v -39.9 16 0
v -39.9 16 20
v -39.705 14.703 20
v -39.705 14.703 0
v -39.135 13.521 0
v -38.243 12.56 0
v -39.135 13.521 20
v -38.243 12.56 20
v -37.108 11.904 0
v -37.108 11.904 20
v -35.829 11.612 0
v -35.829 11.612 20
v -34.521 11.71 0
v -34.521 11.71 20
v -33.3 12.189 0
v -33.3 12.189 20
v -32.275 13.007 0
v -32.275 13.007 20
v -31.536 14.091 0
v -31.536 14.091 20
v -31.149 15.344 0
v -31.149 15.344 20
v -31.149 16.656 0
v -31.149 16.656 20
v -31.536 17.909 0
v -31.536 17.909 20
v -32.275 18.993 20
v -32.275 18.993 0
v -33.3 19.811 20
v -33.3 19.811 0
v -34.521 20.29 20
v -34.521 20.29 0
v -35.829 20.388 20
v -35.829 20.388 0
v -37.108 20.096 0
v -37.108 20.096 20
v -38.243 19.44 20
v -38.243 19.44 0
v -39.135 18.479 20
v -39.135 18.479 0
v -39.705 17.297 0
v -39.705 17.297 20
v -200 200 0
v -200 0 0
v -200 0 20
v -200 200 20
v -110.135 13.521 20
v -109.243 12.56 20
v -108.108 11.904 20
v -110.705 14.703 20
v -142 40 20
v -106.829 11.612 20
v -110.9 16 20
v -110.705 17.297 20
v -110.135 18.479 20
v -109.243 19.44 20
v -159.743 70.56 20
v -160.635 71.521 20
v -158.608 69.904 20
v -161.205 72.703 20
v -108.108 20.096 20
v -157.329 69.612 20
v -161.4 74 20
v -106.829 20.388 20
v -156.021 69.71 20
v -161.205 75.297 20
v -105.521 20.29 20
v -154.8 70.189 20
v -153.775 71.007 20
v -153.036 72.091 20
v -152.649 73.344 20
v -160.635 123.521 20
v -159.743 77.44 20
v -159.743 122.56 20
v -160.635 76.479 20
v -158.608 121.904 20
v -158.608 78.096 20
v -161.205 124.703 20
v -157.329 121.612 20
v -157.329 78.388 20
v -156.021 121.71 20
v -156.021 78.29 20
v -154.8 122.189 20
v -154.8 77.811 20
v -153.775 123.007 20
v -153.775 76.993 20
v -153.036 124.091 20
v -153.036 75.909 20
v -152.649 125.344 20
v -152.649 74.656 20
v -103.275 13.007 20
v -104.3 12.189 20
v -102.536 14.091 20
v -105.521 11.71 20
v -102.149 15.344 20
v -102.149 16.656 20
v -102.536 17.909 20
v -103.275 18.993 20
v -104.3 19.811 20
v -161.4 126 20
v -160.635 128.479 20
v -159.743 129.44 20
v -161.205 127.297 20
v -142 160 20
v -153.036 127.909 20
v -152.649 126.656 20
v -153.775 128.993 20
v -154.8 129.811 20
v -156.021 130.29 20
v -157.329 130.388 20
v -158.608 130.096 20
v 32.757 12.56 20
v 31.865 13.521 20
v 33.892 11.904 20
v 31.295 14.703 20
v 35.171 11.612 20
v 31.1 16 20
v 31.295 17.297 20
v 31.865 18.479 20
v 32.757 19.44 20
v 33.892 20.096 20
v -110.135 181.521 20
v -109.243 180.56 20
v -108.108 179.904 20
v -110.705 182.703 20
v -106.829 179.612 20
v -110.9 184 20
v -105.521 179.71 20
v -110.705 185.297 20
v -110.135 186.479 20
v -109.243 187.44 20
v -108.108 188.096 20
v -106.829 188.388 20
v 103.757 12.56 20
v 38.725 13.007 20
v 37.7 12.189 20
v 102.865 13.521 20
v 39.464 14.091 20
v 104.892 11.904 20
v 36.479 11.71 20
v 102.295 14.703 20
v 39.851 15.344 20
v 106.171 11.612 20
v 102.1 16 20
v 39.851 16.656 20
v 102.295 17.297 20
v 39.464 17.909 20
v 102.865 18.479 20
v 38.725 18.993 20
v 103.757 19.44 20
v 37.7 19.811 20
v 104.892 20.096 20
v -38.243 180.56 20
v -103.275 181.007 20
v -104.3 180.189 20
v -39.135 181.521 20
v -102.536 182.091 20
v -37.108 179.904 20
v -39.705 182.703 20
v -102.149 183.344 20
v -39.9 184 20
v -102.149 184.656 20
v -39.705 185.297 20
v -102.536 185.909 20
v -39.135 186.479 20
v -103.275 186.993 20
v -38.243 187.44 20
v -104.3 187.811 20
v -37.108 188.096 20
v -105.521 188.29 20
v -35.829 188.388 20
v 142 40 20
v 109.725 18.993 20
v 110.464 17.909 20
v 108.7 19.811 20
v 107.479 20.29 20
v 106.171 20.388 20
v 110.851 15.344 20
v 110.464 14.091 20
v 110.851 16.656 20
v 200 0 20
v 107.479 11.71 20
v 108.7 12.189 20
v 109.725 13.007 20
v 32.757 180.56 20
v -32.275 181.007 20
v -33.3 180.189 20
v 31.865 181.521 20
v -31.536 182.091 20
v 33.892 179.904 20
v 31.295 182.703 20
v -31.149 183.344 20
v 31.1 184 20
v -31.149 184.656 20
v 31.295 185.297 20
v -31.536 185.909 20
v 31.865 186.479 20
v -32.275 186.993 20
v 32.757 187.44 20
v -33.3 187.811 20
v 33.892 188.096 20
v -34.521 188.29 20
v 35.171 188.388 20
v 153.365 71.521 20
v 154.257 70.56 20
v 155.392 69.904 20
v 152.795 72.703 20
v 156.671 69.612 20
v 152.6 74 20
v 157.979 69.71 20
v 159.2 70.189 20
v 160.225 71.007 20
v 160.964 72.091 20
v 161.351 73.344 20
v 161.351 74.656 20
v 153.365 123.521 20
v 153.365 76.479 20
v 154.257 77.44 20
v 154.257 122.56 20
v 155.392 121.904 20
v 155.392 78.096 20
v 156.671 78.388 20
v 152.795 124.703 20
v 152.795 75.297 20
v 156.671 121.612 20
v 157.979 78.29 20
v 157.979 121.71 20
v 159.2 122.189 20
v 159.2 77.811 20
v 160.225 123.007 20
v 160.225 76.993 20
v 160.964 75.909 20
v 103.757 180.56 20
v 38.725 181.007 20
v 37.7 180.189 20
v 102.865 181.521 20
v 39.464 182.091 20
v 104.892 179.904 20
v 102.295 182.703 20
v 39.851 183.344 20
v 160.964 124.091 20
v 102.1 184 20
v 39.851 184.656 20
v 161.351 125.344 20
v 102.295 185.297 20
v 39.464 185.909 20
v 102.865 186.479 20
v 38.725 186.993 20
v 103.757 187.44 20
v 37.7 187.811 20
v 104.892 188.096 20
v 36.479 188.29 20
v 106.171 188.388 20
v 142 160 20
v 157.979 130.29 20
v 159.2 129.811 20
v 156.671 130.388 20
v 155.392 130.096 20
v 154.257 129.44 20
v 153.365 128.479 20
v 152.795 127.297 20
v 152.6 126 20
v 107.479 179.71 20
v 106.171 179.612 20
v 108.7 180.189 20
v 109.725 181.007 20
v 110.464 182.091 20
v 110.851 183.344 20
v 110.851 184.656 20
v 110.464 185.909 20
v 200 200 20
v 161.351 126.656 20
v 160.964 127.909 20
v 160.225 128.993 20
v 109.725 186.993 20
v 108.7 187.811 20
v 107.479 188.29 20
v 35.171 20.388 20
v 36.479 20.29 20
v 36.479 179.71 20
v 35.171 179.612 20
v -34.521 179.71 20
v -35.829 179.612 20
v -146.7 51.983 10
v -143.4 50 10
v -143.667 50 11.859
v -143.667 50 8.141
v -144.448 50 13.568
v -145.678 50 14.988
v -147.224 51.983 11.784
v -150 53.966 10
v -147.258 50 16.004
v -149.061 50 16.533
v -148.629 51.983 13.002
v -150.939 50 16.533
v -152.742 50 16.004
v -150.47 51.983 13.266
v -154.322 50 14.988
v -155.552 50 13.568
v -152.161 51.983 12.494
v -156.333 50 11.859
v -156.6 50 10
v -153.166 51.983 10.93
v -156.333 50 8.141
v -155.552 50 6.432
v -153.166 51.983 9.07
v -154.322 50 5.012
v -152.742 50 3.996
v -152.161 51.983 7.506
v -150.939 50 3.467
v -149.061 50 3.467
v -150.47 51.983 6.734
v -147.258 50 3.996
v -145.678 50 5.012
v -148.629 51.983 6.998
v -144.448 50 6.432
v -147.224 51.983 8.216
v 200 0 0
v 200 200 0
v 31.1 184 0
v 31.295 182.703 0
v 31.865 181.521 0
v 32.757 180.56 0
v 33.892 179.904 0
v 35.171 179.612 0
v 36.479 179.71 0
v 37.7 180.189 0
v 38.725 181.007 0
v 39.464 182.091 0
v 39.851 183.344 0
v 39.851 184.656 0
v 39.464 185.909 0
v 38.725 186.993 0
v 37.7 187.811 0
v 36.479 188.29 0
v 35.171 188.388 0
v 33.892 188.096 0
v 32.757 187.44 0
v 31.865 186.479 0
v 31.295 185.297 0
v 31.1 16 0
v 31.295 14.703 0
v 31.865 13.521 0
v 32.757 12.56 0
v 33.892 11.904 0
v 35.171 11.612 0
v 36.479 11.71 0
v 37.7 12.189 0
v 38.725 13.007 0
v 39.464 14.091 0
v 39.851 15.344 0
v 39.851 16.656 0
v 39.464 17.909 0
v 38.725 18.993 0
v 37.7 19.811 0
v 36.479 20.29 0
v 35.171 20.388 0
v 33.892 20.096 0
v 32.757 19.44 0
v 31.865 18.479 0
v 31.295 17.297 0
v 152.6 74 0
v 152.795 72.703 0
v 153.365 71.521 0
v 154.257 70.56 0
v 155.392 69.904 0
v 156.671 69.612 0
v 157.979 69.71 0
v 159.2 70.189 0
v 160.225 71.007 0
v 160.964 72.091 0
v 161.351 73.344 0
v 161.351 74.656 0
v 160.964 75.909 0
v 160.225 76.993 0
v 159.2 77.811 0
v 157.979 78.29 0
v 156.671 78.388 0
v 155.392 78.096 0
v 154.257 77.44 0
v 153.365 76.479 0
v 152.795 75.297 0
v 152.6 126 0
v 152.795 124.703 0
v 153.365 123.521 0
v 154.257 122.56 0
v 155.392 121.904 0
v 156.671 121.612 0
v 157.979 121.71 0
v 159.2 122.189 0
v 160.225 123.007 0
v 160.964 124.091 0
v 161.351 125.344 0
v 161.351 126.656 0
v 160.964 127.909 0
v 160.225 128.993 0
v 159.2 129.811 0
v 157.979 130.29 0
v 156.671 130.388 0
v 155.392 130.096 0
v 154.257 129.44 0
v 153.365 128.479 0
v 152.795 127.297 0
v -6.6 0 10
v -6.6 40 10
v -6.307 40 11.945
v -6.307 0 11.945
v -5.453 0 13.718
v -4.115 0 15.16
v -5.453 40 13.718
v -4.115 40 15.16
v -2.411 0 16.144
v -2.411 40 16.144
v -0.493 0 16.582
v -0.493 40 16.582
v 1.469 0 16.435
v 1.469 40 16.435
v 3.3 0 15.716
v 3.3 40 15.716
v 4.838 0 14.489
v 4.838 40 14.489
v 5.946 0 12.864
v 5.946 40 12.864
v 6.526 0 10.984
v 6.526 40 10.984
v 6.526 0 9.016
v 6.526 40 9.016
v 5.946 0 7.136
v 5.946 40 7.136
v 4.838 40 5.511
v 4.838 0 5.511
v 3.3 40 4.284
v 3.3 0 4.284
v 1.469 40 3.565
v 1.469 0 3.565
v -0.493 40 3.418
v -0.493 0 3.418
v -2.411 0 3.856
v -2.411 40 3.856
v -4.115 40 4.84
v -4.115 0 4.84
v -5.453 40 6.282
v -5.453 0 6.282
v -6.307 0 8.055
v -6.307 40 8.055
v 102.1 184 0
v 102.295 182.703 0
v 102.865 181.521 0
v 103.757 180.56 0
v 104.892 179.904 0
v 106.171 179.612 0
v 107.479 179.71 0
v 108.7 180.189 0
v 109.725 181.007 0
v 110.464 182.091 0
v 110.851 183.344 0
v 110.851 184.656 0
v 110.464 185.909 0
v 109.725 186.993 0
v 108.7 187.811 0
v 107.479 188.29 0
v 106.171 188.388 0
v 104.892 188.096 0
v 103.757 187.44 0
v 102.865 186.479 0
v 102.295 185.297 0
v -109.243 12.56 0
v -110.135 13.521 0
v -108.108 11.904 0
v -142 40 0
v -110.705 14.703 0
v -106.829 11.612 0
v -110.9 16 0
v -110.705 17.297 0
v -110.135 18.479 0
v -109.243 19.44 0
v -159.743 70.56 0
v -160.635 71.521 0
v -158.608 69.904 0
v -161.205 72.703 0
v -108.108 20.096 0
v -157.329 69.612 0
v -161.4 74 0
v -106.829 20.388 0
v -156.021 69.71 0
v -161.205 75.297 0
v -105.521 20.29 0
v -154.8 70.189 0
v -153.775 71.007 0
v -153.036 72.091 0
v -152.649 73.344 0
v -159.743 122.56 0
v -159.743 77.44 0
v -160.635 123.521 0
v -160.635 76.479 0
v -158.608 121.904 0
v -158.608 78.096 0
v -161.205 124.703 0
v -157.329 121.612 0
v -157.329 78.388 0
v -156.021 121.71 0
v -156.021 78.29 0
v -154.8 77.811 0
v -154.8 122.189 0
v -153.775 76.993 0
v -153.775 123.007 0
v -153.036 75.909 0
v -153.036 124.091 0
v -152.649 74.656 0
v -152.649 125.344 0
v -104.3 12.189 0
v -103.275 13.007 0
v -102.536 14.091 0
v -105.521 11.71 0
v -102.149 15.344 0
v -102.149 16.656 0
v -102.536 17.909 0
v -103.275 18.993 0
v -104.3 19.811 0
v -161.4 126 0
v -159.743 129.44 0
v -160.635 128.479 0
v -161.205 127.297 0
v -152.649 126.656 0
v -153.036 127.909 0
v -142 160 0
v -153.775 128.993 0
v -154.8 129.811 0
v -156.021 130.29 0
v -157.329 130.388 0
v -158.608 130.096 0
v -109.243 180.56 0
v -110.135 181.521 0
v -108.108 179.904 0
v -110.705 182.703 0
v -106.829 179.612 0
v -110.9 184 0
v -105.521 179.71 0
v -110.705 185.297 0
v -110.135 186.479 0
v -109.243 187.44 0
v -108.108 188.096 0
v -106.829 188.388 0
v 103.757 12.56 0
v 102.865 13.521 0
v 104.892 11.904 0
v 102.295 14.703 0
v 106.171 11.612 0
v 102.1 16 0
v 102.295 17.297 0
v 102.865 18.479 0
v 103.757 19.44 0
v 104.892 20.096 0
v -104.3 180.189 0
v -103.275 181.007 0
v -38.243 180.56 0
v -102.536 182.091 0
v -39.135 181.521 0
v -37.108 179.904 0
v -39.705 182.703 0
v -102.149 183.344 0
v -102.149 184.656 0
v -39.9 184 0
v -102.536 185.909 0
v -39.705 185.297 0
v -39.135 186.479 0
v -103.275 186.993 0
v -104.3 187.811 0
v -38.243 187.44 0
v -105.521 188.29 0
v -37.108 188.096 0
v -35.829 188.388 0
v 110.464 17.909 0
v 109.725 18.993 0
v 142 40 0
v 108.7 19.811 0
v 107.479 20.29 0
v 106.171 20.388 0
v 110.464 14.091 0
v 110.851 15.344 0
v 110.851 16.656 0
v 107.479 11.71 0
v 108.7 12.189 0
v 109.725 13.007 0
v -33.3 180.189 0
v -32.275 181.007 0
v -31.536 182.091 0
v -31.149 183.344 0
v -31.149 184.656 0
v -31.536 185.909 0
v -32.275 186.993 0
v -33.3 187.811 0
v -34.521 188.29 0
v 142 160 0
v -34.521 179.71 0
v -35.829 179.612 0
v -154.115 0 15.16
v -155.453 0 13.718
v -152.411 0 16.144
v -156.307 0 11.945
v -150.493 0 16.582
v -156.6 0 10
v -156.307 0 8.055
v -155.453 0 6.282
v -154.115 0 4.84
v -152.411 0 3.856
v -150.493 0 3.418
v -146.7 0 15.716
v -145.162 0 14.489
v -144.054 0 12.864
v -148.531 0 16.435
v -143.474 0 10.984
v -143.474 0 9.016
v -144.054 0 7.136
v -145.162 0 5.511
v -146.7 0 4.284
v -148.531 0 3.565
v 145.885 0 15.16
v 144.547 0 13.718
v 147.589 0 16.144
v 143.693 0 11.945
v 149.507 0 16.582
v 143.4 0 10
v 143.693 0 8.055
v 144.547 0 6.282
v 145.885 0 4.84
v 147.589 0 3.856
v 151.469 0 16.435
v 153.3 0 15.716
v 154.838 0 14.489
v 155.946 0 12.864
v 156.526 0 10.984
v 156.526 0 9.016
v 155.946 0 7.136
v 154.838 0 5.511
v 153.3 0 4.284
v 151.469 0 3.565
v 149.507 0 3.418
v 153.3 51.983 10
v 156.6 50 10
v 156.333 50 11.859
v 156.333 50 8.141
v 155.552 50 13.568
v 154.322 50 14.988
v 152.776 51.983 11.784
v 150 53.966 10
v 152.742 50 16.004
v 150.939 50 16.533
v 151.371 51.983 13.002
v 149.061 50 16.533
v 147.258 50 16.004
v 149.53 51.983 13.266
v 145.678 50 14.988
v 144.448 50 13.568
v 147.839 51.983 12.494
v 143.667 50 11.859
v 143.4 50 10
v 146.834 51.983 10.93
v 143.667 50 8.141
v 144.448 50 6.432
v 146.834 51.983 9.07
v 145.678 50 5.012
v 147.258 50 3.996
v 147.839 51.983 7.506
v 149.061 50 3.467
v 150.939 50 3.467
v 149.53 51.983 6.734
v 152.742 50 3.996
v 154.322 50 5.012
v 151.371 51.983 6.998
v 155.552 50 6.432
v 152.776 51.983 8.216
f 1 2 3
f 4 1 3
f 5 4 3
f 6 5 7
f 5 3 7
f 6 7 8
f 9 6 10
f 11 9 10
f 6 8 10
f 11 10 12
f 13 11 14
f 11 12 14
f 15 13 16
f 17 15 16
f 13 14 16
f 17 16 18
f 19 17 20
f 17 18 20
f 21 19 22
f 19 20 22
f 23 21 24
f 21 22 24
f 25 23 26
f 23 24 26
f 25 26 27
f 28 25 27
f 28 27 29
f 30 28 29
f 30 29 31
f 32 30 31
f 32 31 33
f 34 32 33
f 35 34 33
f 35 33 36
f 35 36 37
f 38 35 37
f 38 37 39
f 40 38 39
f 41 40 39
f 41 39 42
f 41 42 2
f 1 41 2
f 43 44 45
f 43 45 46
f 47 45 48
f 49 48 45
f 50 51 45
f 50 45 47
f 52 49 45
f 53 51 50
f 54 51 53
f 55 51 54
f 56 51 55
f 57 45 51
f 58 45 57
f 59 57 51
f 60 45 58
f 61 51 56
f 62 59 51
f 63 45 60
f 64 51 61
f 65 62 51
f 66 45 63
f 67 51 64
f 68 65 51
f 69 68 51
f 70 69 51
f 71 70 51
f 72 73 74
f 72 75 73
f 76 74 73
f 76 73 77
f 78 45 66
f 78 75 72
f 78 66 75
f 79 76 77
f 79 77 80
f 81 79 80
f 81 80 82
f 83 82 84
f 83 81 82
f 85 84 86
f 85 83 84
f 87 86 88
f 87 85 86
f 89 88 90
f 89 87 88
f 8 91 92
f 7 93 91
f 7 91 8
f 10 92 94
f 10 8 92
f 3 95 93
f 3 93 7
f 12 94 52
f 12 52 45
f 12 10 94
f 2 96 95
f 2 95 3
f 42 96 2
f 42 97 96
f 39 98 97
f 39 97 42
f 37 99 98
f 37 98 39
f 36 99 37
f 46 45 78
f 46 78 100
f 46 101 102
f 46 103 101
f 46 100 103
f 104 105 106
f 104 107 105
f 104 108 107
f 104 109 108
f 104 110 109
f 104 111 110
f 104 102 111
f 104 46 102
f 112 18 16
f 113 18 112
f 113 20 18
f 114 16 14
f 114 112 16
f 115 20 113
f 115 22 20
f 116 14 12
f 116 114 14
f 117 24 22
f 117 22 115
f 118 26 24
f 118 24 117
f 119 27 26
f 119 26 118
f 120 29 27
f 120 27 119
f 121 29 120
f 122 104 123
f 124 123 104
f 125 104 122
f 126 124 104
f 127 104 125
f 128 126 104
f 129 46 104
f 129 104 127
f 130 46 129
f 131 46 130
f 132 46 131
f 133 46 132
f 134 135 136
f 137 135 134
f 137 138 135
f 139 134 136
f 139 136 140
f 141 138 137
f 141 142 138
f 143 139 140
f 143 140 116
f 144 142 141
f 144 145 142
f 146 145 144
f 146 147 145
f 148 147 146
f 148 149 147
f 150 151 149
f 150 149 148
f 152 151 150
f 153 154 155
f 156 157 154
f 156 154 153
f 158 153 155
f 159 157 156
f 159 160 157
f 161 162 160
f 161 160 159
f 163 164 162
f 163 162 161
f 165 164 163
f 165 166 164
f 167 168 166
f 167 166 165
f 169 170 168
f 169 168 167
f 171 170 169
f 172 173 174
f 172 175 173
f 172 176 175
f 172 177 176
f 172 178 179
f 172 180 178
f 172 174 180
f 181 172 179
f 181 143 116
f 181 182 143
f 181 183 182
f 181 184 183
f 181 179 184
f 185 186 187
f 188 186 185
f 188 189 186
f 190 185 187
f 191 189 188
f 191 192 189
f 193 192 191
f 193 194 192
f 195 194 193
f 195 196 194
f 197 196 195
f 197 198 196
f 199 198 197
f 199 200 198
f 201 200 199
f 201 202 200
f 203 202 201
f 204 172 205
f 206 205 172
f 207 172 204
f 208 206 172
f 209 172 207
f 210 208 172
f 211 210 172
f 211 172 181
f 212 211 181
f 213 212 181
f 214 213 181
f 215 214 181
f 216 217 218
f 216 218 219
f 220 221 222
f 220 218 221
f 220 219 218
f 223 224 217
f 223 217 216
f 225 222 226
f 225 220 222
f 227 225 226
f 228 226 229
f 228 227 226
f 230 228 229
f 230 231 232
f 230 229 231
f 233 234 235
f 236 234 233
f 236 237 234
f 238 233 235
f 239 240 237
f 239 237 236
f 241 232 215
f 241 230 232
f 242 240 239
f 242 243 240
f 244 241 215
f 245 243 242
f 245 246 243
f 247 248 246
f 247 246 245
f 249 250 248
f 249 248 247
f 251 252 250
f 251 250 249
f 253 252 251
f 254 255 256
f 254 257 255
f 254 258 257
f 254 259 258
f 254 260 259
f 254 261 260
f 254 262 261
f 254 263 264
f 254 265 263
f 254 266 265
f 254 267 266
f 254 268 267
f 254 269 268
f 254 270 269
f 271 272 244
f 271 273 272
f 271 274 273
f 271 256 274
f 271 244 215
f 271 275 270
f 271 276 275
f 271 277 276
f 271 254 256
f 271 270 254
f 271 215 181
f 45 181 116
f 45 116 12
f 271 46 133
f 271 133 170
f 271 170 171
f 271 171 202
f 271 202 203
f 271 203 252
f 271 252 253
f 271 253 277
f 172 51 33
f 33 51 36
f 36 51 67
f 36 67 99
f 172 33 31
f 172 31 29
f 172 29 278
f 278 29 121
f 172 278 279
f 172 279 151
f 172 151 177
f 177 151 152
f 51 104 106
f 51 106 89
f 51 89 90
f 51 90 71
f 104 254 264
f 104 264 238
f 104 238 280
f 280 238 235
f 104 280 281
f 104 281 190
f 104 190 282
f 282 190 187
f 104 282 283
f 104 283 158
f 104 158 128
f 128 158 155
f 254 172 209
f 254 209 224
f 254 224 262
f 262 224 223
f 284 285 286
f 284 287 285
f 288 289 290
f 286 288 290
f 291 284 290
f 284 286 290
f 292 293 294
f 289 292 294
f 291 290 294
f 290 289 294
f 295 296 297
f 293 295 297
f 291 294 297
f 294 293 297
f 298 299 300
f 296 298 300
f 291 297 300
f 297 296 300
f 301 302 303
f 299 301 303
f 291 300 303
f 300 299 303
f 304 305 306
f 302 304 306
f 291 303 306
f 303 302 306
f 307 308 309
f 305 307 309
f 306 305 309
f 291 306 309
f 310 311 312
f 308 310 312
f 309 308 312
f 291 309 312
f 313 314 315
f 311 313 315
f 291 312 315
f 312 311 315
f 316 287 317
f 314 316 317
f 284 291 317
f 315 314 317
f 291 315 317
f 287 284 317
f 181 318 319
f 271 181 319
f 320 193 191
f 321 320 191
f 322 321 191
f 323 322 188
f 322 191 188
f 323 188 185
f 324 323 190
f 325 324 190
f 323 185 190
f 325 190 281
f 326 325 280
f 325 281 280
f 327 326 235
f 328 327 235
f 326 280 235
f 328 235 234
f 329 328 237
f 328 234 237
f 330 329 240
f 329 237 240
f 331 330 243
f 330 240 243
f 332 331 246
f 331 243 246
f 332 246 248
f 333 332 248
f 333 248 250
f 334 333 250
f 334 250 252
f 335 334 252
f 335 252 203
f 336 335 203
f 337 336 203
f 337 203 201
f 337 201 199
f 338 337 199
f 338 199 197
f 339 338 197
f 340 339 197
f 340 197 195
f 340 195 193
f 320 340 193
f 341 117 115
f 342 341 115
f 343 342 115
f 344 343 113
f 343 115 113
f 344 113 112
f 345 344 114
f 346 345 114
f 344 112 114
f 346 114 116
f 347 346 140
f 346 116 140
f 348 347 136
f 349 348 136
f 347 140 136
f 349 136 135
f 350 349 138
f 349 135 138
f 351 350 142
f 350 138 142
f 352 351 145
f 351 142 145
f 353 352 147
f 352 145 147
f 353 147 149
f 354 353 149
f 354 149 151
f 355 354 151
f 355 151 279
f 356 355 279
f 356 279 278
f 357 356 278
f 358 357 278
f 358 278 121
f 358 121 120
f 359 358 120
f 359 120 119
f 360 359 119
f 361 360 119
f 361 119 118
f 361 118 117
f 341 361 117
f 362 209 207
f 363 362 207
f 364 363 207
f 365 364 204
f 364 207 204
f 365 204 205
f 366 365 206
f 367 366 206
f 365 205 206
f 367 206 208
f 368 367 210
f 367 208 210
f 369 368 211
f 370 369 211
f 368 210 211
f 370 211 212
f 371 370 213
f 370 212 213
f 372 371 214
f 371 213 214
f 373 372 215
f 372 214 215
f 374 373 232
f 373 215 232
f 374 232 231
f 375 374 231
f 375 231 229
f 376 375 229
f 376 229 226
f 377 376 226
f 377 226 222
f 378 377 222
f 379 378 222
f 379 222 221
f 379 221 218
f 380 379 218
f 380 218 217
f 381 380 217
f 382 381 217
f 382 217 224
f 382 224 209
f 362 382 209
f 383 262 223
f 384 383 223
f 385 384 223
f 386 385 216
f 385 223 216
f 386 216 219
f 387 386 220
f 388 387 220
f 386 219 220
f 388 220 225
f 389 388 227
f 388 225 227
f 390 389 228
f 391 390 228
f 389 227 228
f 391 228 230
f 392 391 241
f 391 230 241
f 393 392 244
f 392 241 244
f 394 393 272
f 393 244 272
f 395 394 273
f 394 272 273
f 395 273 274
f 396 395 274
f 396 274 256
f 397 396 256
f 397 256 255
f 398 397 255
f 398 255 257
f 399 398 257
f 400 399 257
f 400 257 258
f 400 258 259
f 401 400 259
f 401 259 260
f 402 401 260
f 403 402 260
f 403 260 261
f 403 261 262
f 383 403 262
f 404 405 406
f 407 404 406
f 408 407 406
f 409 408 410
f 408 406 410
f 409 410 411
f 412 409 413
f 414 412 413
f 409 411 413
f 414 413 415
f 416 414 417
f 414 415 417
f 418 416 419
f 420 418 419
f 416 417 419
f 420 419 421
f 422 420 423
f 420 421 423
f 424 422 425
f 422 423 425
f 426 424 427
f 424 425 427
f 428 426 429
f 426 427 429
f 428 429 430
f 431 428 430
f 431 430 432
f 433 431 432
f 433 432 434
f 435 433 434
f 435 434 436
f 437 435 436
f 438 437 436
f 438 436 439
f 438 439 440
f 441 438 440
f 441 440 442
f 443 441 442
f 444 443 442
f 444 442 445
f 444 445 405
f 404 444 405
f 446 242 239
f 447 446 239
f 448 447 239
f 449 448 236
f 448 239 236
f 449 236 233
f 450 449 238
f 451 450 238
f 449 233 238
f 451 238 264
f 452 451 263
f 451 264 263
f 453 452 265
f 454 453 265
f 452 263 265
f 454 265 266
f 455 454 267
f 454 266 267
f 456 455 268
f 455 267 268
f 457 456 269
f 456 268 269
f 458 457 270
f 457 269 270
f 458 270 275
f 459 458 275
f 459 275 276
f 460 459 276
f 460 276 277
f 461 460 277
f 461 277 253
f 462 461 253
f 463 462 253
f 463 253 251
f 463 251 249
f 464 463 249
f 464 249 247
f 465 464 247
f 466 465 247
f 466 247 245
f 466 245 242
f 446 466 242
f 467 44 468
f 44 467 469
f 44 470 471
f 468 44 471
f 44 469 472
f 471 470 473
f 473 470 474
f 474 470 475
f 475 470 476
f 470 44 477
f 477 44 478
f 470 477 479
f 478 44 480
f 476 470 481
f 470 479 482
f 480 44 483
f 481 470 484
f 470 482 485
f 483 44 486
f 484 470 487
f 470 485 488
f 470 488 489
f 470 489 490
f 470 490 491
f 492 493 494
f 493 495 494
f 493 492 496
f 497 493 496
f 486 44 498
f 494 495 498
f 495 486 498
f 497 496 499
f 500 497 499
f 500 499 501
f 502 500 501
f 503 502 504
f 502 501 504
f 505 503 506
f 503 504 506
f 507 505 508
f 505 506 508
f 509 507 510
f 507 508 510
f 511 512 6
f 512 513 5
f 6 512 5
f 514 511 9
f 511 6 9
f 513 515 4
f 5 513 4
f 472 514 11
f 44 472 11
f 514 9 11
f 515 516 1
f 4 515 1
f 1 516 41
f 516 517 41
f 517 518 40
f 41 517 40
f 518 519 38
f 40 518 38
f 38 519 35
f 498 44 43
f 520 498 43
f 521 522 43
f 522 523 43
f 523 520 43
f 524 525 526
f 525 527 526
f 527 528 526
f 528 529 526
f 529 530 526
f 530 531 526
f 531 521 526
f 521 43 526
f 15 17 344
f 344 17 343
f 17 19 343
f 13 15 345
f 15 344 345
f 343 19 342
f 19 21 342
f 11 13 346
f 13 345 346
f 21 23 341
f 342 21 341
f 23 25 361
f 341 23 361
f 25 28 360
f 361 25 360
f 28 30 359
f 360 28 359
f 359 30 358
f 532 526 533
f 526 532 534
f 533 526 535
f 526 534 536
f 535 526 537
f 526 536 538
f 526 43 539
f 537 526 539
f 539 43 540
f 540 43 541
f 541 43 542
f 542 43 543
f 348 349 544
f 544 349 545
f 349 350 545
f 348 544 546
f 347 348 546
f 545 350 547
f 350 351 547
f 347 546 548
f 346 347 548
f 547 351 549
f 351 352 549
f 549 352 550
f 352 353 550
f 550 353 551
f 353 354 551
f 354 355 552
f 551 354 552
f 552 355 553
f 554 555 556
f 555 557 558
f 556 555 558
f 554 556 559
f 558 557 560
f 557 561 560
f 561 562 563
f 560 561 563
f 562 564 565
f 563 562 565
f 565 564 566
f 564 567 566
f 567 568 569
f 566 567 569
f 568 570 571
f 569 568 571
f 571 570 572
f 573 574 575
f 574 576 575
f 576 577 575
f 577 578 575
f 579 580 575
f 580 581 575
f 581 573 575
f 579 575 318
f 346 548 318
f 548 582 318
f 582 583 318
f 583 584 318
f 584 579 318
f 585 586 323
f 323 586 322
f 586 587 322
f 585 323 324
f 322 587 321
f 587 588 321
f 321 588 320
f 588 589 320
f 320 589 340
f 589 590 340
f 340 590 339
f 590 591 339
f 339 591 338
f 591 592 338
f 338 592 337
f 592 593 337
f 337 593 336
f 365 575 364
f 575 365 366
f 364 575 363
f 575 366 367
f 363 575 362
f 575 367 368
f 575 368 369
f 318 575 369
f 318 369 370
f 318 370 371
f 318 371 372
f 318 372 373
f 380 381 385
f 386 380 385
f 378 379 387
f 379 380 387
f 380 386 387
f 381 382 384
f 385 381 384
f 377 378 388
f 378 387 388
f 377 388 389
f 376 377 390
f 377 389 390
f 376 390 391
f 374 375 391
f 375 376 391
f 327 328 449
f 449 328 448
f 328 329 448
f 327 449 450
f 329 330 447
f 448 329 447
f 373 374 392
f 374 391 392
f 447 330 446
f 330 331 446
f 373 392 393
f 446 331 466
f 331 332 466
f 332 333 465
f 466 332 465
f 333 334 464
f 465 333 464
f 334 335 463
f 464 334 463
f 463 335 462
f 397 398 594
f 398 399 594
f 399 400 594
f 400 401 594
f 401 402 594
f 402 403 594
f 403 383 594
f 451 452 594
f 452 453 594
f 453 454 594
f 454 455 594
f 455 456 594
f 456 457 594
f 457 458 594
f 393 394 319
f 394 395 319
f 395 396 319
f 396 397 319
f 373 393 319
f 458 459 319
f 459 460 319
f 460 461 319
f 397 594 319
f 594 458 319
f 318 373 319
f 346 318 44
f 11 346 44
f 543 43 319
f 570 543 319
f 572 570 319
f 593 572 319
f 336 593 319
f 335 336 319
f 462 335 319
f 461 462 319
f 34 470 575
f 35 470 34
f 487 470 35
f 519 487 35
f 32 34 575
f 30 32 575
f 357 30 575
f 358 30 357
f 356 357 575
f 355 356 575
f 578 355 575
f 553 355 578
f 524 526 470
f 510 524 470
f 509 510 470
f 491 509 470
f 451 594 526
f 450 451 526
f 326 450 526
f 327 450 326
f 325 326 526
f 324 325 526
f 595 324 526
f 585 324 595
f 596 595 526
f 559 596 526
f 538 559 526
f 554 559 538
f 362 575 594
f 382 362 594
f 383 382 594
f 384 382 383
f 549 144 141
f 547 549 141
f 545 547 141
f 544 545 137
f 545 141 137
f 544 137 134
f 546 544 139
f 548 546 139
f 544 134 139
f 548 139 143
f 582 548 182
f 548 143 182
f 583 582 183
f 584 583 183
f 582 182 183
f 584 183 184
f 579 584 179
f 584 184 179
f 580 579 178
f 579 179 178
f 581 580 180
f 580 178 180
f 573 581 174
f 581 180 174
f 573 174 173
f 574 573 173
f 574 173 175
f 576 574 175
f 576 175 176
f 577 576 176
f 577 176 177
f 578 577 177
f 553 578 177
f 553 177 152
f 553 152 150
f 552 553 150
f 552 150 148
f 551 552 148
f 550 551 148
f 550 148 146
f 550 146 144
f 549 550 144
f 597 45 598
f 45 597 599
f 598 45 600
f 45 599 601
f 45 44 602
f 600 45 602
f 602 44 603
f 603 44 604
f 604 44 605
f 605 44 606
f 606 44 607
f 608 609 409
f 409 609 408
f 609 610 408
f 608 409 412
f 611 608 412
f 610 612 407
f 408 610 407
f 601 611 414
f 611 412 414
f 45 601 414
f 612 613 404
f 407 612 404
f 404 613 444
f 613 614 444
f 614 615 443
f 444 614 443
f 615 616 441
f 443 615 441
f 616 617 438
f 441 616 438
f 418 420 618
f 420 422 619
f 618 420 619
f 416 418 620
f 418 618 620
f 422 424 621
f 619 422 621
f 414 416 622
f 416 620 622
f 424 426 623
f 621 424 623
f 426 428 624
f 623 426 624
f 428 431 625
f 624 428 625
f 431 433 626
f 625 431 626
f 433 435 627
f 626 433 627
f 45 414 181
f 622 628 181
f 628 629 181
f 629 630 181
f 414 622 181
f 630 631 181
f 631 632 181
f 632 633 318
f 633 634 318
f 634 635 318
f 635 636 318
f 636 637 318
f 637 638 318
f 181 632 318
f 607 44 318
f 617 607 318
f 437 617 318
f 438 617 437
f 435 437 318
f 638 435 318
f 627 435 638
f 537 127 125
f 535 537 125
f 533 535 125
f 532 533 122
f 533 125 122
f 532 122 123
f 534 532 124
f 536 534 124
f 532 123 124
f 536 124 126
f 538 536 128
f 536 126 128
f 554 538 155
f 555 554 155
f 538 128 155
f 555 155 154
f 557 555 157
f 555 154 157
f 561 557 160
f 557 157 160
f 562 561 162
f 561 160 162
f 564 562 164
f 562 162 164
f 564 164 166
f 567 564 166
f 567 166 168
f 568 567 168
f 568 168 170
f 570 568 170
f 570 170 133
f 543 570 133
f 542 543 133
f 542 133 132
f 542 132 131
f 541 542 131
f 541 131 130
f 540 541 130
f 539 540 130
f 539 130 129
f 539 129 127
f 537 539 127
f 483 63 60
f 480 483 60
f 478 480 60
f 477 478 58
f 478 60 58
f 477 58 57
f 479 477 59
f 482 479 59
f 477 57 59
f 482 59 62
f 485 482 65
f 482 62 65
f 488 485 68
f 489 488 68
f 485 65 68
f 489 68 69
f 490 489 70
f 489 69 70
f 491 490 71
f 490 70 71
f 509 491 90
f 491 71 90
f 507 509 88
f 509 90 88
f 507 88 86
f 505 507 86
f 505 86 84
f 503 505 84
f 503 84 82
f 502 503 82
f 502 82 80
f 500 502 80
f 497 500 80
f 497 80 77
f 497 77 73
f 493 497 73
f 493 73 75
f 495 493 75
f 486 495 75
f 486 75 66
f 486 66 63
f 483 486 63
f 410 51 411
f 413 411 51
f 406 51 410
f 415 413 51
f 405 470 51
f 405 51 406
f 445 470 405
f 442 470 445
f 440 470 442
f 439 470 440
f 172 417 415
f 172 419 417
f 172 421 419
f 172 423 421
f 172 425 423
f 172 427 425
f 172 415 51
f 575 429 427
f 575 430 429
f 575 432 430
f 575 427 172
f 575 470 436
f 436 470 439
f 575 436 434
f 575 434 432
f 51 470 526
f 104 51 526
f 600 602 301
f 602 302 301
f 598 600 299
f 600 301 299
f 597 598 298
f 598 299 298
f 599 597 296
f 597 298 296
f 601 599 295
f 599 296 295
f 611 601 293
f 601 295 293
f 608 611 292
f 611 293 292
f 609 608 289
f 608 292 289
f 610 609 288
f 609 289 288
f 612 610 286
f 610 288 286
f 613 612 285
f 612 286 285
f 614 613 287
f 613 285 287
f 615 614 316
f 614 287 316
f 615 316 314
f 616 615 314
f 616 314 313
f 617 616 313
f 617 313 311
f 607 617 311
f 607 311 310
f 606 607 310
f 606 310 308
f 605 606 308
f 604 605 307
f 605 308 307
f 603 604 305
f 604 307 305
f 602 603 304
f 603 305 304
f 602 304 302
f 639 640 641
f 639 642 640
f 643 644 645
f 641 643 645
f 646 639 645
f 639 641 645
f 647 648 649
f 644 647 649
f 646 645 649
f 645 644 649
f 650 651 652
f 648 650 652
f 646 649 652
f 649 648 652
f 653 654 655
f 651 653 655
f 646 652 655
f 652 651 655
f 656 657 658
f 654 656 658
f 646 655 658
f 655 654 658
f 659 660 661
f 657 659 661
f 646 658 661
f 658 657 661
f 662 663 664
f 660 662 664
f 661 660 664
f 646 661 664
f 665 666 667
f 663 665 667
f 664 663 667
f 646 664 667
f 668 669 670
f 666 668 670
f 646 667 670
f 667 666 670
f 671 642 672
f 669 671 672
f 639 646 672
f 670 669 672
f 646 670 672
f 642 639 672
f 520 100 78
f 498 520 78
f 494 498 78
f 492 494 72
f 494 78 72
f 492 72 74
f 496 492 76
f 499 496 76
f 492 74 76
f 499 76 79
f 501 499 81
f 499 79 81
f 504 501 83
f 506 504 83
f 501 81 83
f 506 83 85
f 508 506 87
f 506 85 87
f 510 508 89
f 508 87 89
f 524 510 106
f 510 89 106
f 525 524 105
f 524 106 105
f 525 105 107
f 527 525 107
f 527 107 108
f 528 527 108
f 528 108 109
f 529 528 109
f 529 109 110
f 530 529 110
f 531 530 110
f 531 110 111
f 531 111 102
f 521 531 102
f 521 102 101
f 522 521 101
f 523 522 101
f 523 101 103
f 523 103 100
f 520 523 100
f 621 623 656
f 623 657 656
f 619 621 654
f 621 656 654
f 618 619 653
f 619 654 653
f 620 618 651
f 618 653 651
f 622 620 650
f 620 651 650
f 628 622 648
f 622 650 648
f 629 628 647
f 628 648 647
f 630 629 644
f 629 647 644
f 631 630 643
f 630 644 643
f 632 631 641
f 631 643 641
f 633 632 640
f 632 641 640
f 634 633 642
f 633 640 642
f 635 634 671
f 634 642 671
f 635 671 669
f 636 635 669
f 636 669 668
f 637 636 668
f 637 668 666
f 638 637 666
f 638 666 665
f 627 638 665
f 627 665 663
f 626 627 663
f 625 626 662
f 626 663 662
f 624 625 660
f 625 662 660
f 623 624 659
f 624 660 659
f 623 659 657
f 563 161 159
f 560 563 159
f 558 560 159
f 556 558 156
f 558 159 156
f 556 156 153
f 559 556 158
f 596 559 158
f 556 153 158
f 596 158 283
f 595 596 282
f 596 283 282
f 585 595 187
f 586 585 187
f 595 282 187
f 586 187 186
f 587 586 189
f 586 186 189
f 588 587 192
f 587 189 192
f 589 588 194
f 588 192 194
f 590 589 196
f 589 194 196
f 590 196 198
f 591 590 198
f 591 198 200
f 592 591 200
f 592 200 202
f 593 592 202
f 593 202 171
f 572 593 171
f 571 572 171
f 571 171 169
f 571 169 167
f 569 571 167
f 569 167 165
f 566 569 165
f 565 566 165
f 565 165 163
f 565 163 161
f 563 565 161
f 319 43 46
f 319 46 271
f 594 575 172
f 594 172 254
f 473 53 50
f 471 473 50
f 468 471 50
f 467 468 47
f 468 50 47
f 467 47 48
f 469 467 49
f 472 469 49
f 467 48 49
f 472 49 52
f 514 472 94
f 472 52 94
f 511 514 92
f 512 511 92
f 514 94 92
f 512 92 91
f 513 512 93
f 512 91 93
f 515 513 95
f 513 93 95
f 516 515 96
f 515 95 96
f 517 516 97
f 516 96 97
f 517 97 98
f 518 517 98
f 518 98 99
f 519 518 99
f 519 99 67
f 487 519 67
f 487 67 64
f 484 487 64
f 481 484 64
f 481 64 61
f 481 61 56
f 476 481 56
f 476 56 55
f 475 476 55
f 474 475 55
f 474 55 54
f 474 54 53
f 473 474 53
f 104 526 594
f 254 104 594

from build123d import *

# Parameters (mm, degrees)
F0_W     = 400
F0_H     = 200
F0_W_2   = 284
F0_H_2   = 120
F1_DEPTH = 20
F2_D     = 8.8
F4_D     = 13.2
F4_DEPTH = 50
F4_TIP   = 3.9656800856


with BuildPart() as f1:
    # F0 (on Top) → F1 (new body)
    with BuildSketch(Plane.XY):
        with Locations((0, 100)):
            Rectangle(F0_W, F0_H)
        with Locations((0, 100)):
            Rectangle(F0_W_2, F0_H_2, mode=Mode.SUBTRACT)
    extrude(amount=F1_DEPTH)

    # F2 (through all)
    with Locations(Plane(origin=(0, 0, 0), x_dir=(1, 0, 0), z_dir=(0, 0, -1))):
        with Locations((-157, -126), (-157, -74), (-106.5, -16), (-35.5, -16), (35.5, -16), (106.5, -16), (157, -74), (157, -126), (106.5, -184), (35.5, -184), (-35.5, -184), (-106.5, -184)):
            Hole(F2_D / 2)

    # F4
    with Locations(Plane.XZ):
        with Locations((-150, 10), (150, 10), (0, 10)):
            Hole(F4_D / 2, depth=F4_DEPTH)
            with Locations((0, 0, -(F4_DEPTH + F4_TIP / 2))):  # 118° drill point
                Cone(0, F4_D / 2, F4_TIP, mode=Mode.SUBTRACT)


solid = f1.part
